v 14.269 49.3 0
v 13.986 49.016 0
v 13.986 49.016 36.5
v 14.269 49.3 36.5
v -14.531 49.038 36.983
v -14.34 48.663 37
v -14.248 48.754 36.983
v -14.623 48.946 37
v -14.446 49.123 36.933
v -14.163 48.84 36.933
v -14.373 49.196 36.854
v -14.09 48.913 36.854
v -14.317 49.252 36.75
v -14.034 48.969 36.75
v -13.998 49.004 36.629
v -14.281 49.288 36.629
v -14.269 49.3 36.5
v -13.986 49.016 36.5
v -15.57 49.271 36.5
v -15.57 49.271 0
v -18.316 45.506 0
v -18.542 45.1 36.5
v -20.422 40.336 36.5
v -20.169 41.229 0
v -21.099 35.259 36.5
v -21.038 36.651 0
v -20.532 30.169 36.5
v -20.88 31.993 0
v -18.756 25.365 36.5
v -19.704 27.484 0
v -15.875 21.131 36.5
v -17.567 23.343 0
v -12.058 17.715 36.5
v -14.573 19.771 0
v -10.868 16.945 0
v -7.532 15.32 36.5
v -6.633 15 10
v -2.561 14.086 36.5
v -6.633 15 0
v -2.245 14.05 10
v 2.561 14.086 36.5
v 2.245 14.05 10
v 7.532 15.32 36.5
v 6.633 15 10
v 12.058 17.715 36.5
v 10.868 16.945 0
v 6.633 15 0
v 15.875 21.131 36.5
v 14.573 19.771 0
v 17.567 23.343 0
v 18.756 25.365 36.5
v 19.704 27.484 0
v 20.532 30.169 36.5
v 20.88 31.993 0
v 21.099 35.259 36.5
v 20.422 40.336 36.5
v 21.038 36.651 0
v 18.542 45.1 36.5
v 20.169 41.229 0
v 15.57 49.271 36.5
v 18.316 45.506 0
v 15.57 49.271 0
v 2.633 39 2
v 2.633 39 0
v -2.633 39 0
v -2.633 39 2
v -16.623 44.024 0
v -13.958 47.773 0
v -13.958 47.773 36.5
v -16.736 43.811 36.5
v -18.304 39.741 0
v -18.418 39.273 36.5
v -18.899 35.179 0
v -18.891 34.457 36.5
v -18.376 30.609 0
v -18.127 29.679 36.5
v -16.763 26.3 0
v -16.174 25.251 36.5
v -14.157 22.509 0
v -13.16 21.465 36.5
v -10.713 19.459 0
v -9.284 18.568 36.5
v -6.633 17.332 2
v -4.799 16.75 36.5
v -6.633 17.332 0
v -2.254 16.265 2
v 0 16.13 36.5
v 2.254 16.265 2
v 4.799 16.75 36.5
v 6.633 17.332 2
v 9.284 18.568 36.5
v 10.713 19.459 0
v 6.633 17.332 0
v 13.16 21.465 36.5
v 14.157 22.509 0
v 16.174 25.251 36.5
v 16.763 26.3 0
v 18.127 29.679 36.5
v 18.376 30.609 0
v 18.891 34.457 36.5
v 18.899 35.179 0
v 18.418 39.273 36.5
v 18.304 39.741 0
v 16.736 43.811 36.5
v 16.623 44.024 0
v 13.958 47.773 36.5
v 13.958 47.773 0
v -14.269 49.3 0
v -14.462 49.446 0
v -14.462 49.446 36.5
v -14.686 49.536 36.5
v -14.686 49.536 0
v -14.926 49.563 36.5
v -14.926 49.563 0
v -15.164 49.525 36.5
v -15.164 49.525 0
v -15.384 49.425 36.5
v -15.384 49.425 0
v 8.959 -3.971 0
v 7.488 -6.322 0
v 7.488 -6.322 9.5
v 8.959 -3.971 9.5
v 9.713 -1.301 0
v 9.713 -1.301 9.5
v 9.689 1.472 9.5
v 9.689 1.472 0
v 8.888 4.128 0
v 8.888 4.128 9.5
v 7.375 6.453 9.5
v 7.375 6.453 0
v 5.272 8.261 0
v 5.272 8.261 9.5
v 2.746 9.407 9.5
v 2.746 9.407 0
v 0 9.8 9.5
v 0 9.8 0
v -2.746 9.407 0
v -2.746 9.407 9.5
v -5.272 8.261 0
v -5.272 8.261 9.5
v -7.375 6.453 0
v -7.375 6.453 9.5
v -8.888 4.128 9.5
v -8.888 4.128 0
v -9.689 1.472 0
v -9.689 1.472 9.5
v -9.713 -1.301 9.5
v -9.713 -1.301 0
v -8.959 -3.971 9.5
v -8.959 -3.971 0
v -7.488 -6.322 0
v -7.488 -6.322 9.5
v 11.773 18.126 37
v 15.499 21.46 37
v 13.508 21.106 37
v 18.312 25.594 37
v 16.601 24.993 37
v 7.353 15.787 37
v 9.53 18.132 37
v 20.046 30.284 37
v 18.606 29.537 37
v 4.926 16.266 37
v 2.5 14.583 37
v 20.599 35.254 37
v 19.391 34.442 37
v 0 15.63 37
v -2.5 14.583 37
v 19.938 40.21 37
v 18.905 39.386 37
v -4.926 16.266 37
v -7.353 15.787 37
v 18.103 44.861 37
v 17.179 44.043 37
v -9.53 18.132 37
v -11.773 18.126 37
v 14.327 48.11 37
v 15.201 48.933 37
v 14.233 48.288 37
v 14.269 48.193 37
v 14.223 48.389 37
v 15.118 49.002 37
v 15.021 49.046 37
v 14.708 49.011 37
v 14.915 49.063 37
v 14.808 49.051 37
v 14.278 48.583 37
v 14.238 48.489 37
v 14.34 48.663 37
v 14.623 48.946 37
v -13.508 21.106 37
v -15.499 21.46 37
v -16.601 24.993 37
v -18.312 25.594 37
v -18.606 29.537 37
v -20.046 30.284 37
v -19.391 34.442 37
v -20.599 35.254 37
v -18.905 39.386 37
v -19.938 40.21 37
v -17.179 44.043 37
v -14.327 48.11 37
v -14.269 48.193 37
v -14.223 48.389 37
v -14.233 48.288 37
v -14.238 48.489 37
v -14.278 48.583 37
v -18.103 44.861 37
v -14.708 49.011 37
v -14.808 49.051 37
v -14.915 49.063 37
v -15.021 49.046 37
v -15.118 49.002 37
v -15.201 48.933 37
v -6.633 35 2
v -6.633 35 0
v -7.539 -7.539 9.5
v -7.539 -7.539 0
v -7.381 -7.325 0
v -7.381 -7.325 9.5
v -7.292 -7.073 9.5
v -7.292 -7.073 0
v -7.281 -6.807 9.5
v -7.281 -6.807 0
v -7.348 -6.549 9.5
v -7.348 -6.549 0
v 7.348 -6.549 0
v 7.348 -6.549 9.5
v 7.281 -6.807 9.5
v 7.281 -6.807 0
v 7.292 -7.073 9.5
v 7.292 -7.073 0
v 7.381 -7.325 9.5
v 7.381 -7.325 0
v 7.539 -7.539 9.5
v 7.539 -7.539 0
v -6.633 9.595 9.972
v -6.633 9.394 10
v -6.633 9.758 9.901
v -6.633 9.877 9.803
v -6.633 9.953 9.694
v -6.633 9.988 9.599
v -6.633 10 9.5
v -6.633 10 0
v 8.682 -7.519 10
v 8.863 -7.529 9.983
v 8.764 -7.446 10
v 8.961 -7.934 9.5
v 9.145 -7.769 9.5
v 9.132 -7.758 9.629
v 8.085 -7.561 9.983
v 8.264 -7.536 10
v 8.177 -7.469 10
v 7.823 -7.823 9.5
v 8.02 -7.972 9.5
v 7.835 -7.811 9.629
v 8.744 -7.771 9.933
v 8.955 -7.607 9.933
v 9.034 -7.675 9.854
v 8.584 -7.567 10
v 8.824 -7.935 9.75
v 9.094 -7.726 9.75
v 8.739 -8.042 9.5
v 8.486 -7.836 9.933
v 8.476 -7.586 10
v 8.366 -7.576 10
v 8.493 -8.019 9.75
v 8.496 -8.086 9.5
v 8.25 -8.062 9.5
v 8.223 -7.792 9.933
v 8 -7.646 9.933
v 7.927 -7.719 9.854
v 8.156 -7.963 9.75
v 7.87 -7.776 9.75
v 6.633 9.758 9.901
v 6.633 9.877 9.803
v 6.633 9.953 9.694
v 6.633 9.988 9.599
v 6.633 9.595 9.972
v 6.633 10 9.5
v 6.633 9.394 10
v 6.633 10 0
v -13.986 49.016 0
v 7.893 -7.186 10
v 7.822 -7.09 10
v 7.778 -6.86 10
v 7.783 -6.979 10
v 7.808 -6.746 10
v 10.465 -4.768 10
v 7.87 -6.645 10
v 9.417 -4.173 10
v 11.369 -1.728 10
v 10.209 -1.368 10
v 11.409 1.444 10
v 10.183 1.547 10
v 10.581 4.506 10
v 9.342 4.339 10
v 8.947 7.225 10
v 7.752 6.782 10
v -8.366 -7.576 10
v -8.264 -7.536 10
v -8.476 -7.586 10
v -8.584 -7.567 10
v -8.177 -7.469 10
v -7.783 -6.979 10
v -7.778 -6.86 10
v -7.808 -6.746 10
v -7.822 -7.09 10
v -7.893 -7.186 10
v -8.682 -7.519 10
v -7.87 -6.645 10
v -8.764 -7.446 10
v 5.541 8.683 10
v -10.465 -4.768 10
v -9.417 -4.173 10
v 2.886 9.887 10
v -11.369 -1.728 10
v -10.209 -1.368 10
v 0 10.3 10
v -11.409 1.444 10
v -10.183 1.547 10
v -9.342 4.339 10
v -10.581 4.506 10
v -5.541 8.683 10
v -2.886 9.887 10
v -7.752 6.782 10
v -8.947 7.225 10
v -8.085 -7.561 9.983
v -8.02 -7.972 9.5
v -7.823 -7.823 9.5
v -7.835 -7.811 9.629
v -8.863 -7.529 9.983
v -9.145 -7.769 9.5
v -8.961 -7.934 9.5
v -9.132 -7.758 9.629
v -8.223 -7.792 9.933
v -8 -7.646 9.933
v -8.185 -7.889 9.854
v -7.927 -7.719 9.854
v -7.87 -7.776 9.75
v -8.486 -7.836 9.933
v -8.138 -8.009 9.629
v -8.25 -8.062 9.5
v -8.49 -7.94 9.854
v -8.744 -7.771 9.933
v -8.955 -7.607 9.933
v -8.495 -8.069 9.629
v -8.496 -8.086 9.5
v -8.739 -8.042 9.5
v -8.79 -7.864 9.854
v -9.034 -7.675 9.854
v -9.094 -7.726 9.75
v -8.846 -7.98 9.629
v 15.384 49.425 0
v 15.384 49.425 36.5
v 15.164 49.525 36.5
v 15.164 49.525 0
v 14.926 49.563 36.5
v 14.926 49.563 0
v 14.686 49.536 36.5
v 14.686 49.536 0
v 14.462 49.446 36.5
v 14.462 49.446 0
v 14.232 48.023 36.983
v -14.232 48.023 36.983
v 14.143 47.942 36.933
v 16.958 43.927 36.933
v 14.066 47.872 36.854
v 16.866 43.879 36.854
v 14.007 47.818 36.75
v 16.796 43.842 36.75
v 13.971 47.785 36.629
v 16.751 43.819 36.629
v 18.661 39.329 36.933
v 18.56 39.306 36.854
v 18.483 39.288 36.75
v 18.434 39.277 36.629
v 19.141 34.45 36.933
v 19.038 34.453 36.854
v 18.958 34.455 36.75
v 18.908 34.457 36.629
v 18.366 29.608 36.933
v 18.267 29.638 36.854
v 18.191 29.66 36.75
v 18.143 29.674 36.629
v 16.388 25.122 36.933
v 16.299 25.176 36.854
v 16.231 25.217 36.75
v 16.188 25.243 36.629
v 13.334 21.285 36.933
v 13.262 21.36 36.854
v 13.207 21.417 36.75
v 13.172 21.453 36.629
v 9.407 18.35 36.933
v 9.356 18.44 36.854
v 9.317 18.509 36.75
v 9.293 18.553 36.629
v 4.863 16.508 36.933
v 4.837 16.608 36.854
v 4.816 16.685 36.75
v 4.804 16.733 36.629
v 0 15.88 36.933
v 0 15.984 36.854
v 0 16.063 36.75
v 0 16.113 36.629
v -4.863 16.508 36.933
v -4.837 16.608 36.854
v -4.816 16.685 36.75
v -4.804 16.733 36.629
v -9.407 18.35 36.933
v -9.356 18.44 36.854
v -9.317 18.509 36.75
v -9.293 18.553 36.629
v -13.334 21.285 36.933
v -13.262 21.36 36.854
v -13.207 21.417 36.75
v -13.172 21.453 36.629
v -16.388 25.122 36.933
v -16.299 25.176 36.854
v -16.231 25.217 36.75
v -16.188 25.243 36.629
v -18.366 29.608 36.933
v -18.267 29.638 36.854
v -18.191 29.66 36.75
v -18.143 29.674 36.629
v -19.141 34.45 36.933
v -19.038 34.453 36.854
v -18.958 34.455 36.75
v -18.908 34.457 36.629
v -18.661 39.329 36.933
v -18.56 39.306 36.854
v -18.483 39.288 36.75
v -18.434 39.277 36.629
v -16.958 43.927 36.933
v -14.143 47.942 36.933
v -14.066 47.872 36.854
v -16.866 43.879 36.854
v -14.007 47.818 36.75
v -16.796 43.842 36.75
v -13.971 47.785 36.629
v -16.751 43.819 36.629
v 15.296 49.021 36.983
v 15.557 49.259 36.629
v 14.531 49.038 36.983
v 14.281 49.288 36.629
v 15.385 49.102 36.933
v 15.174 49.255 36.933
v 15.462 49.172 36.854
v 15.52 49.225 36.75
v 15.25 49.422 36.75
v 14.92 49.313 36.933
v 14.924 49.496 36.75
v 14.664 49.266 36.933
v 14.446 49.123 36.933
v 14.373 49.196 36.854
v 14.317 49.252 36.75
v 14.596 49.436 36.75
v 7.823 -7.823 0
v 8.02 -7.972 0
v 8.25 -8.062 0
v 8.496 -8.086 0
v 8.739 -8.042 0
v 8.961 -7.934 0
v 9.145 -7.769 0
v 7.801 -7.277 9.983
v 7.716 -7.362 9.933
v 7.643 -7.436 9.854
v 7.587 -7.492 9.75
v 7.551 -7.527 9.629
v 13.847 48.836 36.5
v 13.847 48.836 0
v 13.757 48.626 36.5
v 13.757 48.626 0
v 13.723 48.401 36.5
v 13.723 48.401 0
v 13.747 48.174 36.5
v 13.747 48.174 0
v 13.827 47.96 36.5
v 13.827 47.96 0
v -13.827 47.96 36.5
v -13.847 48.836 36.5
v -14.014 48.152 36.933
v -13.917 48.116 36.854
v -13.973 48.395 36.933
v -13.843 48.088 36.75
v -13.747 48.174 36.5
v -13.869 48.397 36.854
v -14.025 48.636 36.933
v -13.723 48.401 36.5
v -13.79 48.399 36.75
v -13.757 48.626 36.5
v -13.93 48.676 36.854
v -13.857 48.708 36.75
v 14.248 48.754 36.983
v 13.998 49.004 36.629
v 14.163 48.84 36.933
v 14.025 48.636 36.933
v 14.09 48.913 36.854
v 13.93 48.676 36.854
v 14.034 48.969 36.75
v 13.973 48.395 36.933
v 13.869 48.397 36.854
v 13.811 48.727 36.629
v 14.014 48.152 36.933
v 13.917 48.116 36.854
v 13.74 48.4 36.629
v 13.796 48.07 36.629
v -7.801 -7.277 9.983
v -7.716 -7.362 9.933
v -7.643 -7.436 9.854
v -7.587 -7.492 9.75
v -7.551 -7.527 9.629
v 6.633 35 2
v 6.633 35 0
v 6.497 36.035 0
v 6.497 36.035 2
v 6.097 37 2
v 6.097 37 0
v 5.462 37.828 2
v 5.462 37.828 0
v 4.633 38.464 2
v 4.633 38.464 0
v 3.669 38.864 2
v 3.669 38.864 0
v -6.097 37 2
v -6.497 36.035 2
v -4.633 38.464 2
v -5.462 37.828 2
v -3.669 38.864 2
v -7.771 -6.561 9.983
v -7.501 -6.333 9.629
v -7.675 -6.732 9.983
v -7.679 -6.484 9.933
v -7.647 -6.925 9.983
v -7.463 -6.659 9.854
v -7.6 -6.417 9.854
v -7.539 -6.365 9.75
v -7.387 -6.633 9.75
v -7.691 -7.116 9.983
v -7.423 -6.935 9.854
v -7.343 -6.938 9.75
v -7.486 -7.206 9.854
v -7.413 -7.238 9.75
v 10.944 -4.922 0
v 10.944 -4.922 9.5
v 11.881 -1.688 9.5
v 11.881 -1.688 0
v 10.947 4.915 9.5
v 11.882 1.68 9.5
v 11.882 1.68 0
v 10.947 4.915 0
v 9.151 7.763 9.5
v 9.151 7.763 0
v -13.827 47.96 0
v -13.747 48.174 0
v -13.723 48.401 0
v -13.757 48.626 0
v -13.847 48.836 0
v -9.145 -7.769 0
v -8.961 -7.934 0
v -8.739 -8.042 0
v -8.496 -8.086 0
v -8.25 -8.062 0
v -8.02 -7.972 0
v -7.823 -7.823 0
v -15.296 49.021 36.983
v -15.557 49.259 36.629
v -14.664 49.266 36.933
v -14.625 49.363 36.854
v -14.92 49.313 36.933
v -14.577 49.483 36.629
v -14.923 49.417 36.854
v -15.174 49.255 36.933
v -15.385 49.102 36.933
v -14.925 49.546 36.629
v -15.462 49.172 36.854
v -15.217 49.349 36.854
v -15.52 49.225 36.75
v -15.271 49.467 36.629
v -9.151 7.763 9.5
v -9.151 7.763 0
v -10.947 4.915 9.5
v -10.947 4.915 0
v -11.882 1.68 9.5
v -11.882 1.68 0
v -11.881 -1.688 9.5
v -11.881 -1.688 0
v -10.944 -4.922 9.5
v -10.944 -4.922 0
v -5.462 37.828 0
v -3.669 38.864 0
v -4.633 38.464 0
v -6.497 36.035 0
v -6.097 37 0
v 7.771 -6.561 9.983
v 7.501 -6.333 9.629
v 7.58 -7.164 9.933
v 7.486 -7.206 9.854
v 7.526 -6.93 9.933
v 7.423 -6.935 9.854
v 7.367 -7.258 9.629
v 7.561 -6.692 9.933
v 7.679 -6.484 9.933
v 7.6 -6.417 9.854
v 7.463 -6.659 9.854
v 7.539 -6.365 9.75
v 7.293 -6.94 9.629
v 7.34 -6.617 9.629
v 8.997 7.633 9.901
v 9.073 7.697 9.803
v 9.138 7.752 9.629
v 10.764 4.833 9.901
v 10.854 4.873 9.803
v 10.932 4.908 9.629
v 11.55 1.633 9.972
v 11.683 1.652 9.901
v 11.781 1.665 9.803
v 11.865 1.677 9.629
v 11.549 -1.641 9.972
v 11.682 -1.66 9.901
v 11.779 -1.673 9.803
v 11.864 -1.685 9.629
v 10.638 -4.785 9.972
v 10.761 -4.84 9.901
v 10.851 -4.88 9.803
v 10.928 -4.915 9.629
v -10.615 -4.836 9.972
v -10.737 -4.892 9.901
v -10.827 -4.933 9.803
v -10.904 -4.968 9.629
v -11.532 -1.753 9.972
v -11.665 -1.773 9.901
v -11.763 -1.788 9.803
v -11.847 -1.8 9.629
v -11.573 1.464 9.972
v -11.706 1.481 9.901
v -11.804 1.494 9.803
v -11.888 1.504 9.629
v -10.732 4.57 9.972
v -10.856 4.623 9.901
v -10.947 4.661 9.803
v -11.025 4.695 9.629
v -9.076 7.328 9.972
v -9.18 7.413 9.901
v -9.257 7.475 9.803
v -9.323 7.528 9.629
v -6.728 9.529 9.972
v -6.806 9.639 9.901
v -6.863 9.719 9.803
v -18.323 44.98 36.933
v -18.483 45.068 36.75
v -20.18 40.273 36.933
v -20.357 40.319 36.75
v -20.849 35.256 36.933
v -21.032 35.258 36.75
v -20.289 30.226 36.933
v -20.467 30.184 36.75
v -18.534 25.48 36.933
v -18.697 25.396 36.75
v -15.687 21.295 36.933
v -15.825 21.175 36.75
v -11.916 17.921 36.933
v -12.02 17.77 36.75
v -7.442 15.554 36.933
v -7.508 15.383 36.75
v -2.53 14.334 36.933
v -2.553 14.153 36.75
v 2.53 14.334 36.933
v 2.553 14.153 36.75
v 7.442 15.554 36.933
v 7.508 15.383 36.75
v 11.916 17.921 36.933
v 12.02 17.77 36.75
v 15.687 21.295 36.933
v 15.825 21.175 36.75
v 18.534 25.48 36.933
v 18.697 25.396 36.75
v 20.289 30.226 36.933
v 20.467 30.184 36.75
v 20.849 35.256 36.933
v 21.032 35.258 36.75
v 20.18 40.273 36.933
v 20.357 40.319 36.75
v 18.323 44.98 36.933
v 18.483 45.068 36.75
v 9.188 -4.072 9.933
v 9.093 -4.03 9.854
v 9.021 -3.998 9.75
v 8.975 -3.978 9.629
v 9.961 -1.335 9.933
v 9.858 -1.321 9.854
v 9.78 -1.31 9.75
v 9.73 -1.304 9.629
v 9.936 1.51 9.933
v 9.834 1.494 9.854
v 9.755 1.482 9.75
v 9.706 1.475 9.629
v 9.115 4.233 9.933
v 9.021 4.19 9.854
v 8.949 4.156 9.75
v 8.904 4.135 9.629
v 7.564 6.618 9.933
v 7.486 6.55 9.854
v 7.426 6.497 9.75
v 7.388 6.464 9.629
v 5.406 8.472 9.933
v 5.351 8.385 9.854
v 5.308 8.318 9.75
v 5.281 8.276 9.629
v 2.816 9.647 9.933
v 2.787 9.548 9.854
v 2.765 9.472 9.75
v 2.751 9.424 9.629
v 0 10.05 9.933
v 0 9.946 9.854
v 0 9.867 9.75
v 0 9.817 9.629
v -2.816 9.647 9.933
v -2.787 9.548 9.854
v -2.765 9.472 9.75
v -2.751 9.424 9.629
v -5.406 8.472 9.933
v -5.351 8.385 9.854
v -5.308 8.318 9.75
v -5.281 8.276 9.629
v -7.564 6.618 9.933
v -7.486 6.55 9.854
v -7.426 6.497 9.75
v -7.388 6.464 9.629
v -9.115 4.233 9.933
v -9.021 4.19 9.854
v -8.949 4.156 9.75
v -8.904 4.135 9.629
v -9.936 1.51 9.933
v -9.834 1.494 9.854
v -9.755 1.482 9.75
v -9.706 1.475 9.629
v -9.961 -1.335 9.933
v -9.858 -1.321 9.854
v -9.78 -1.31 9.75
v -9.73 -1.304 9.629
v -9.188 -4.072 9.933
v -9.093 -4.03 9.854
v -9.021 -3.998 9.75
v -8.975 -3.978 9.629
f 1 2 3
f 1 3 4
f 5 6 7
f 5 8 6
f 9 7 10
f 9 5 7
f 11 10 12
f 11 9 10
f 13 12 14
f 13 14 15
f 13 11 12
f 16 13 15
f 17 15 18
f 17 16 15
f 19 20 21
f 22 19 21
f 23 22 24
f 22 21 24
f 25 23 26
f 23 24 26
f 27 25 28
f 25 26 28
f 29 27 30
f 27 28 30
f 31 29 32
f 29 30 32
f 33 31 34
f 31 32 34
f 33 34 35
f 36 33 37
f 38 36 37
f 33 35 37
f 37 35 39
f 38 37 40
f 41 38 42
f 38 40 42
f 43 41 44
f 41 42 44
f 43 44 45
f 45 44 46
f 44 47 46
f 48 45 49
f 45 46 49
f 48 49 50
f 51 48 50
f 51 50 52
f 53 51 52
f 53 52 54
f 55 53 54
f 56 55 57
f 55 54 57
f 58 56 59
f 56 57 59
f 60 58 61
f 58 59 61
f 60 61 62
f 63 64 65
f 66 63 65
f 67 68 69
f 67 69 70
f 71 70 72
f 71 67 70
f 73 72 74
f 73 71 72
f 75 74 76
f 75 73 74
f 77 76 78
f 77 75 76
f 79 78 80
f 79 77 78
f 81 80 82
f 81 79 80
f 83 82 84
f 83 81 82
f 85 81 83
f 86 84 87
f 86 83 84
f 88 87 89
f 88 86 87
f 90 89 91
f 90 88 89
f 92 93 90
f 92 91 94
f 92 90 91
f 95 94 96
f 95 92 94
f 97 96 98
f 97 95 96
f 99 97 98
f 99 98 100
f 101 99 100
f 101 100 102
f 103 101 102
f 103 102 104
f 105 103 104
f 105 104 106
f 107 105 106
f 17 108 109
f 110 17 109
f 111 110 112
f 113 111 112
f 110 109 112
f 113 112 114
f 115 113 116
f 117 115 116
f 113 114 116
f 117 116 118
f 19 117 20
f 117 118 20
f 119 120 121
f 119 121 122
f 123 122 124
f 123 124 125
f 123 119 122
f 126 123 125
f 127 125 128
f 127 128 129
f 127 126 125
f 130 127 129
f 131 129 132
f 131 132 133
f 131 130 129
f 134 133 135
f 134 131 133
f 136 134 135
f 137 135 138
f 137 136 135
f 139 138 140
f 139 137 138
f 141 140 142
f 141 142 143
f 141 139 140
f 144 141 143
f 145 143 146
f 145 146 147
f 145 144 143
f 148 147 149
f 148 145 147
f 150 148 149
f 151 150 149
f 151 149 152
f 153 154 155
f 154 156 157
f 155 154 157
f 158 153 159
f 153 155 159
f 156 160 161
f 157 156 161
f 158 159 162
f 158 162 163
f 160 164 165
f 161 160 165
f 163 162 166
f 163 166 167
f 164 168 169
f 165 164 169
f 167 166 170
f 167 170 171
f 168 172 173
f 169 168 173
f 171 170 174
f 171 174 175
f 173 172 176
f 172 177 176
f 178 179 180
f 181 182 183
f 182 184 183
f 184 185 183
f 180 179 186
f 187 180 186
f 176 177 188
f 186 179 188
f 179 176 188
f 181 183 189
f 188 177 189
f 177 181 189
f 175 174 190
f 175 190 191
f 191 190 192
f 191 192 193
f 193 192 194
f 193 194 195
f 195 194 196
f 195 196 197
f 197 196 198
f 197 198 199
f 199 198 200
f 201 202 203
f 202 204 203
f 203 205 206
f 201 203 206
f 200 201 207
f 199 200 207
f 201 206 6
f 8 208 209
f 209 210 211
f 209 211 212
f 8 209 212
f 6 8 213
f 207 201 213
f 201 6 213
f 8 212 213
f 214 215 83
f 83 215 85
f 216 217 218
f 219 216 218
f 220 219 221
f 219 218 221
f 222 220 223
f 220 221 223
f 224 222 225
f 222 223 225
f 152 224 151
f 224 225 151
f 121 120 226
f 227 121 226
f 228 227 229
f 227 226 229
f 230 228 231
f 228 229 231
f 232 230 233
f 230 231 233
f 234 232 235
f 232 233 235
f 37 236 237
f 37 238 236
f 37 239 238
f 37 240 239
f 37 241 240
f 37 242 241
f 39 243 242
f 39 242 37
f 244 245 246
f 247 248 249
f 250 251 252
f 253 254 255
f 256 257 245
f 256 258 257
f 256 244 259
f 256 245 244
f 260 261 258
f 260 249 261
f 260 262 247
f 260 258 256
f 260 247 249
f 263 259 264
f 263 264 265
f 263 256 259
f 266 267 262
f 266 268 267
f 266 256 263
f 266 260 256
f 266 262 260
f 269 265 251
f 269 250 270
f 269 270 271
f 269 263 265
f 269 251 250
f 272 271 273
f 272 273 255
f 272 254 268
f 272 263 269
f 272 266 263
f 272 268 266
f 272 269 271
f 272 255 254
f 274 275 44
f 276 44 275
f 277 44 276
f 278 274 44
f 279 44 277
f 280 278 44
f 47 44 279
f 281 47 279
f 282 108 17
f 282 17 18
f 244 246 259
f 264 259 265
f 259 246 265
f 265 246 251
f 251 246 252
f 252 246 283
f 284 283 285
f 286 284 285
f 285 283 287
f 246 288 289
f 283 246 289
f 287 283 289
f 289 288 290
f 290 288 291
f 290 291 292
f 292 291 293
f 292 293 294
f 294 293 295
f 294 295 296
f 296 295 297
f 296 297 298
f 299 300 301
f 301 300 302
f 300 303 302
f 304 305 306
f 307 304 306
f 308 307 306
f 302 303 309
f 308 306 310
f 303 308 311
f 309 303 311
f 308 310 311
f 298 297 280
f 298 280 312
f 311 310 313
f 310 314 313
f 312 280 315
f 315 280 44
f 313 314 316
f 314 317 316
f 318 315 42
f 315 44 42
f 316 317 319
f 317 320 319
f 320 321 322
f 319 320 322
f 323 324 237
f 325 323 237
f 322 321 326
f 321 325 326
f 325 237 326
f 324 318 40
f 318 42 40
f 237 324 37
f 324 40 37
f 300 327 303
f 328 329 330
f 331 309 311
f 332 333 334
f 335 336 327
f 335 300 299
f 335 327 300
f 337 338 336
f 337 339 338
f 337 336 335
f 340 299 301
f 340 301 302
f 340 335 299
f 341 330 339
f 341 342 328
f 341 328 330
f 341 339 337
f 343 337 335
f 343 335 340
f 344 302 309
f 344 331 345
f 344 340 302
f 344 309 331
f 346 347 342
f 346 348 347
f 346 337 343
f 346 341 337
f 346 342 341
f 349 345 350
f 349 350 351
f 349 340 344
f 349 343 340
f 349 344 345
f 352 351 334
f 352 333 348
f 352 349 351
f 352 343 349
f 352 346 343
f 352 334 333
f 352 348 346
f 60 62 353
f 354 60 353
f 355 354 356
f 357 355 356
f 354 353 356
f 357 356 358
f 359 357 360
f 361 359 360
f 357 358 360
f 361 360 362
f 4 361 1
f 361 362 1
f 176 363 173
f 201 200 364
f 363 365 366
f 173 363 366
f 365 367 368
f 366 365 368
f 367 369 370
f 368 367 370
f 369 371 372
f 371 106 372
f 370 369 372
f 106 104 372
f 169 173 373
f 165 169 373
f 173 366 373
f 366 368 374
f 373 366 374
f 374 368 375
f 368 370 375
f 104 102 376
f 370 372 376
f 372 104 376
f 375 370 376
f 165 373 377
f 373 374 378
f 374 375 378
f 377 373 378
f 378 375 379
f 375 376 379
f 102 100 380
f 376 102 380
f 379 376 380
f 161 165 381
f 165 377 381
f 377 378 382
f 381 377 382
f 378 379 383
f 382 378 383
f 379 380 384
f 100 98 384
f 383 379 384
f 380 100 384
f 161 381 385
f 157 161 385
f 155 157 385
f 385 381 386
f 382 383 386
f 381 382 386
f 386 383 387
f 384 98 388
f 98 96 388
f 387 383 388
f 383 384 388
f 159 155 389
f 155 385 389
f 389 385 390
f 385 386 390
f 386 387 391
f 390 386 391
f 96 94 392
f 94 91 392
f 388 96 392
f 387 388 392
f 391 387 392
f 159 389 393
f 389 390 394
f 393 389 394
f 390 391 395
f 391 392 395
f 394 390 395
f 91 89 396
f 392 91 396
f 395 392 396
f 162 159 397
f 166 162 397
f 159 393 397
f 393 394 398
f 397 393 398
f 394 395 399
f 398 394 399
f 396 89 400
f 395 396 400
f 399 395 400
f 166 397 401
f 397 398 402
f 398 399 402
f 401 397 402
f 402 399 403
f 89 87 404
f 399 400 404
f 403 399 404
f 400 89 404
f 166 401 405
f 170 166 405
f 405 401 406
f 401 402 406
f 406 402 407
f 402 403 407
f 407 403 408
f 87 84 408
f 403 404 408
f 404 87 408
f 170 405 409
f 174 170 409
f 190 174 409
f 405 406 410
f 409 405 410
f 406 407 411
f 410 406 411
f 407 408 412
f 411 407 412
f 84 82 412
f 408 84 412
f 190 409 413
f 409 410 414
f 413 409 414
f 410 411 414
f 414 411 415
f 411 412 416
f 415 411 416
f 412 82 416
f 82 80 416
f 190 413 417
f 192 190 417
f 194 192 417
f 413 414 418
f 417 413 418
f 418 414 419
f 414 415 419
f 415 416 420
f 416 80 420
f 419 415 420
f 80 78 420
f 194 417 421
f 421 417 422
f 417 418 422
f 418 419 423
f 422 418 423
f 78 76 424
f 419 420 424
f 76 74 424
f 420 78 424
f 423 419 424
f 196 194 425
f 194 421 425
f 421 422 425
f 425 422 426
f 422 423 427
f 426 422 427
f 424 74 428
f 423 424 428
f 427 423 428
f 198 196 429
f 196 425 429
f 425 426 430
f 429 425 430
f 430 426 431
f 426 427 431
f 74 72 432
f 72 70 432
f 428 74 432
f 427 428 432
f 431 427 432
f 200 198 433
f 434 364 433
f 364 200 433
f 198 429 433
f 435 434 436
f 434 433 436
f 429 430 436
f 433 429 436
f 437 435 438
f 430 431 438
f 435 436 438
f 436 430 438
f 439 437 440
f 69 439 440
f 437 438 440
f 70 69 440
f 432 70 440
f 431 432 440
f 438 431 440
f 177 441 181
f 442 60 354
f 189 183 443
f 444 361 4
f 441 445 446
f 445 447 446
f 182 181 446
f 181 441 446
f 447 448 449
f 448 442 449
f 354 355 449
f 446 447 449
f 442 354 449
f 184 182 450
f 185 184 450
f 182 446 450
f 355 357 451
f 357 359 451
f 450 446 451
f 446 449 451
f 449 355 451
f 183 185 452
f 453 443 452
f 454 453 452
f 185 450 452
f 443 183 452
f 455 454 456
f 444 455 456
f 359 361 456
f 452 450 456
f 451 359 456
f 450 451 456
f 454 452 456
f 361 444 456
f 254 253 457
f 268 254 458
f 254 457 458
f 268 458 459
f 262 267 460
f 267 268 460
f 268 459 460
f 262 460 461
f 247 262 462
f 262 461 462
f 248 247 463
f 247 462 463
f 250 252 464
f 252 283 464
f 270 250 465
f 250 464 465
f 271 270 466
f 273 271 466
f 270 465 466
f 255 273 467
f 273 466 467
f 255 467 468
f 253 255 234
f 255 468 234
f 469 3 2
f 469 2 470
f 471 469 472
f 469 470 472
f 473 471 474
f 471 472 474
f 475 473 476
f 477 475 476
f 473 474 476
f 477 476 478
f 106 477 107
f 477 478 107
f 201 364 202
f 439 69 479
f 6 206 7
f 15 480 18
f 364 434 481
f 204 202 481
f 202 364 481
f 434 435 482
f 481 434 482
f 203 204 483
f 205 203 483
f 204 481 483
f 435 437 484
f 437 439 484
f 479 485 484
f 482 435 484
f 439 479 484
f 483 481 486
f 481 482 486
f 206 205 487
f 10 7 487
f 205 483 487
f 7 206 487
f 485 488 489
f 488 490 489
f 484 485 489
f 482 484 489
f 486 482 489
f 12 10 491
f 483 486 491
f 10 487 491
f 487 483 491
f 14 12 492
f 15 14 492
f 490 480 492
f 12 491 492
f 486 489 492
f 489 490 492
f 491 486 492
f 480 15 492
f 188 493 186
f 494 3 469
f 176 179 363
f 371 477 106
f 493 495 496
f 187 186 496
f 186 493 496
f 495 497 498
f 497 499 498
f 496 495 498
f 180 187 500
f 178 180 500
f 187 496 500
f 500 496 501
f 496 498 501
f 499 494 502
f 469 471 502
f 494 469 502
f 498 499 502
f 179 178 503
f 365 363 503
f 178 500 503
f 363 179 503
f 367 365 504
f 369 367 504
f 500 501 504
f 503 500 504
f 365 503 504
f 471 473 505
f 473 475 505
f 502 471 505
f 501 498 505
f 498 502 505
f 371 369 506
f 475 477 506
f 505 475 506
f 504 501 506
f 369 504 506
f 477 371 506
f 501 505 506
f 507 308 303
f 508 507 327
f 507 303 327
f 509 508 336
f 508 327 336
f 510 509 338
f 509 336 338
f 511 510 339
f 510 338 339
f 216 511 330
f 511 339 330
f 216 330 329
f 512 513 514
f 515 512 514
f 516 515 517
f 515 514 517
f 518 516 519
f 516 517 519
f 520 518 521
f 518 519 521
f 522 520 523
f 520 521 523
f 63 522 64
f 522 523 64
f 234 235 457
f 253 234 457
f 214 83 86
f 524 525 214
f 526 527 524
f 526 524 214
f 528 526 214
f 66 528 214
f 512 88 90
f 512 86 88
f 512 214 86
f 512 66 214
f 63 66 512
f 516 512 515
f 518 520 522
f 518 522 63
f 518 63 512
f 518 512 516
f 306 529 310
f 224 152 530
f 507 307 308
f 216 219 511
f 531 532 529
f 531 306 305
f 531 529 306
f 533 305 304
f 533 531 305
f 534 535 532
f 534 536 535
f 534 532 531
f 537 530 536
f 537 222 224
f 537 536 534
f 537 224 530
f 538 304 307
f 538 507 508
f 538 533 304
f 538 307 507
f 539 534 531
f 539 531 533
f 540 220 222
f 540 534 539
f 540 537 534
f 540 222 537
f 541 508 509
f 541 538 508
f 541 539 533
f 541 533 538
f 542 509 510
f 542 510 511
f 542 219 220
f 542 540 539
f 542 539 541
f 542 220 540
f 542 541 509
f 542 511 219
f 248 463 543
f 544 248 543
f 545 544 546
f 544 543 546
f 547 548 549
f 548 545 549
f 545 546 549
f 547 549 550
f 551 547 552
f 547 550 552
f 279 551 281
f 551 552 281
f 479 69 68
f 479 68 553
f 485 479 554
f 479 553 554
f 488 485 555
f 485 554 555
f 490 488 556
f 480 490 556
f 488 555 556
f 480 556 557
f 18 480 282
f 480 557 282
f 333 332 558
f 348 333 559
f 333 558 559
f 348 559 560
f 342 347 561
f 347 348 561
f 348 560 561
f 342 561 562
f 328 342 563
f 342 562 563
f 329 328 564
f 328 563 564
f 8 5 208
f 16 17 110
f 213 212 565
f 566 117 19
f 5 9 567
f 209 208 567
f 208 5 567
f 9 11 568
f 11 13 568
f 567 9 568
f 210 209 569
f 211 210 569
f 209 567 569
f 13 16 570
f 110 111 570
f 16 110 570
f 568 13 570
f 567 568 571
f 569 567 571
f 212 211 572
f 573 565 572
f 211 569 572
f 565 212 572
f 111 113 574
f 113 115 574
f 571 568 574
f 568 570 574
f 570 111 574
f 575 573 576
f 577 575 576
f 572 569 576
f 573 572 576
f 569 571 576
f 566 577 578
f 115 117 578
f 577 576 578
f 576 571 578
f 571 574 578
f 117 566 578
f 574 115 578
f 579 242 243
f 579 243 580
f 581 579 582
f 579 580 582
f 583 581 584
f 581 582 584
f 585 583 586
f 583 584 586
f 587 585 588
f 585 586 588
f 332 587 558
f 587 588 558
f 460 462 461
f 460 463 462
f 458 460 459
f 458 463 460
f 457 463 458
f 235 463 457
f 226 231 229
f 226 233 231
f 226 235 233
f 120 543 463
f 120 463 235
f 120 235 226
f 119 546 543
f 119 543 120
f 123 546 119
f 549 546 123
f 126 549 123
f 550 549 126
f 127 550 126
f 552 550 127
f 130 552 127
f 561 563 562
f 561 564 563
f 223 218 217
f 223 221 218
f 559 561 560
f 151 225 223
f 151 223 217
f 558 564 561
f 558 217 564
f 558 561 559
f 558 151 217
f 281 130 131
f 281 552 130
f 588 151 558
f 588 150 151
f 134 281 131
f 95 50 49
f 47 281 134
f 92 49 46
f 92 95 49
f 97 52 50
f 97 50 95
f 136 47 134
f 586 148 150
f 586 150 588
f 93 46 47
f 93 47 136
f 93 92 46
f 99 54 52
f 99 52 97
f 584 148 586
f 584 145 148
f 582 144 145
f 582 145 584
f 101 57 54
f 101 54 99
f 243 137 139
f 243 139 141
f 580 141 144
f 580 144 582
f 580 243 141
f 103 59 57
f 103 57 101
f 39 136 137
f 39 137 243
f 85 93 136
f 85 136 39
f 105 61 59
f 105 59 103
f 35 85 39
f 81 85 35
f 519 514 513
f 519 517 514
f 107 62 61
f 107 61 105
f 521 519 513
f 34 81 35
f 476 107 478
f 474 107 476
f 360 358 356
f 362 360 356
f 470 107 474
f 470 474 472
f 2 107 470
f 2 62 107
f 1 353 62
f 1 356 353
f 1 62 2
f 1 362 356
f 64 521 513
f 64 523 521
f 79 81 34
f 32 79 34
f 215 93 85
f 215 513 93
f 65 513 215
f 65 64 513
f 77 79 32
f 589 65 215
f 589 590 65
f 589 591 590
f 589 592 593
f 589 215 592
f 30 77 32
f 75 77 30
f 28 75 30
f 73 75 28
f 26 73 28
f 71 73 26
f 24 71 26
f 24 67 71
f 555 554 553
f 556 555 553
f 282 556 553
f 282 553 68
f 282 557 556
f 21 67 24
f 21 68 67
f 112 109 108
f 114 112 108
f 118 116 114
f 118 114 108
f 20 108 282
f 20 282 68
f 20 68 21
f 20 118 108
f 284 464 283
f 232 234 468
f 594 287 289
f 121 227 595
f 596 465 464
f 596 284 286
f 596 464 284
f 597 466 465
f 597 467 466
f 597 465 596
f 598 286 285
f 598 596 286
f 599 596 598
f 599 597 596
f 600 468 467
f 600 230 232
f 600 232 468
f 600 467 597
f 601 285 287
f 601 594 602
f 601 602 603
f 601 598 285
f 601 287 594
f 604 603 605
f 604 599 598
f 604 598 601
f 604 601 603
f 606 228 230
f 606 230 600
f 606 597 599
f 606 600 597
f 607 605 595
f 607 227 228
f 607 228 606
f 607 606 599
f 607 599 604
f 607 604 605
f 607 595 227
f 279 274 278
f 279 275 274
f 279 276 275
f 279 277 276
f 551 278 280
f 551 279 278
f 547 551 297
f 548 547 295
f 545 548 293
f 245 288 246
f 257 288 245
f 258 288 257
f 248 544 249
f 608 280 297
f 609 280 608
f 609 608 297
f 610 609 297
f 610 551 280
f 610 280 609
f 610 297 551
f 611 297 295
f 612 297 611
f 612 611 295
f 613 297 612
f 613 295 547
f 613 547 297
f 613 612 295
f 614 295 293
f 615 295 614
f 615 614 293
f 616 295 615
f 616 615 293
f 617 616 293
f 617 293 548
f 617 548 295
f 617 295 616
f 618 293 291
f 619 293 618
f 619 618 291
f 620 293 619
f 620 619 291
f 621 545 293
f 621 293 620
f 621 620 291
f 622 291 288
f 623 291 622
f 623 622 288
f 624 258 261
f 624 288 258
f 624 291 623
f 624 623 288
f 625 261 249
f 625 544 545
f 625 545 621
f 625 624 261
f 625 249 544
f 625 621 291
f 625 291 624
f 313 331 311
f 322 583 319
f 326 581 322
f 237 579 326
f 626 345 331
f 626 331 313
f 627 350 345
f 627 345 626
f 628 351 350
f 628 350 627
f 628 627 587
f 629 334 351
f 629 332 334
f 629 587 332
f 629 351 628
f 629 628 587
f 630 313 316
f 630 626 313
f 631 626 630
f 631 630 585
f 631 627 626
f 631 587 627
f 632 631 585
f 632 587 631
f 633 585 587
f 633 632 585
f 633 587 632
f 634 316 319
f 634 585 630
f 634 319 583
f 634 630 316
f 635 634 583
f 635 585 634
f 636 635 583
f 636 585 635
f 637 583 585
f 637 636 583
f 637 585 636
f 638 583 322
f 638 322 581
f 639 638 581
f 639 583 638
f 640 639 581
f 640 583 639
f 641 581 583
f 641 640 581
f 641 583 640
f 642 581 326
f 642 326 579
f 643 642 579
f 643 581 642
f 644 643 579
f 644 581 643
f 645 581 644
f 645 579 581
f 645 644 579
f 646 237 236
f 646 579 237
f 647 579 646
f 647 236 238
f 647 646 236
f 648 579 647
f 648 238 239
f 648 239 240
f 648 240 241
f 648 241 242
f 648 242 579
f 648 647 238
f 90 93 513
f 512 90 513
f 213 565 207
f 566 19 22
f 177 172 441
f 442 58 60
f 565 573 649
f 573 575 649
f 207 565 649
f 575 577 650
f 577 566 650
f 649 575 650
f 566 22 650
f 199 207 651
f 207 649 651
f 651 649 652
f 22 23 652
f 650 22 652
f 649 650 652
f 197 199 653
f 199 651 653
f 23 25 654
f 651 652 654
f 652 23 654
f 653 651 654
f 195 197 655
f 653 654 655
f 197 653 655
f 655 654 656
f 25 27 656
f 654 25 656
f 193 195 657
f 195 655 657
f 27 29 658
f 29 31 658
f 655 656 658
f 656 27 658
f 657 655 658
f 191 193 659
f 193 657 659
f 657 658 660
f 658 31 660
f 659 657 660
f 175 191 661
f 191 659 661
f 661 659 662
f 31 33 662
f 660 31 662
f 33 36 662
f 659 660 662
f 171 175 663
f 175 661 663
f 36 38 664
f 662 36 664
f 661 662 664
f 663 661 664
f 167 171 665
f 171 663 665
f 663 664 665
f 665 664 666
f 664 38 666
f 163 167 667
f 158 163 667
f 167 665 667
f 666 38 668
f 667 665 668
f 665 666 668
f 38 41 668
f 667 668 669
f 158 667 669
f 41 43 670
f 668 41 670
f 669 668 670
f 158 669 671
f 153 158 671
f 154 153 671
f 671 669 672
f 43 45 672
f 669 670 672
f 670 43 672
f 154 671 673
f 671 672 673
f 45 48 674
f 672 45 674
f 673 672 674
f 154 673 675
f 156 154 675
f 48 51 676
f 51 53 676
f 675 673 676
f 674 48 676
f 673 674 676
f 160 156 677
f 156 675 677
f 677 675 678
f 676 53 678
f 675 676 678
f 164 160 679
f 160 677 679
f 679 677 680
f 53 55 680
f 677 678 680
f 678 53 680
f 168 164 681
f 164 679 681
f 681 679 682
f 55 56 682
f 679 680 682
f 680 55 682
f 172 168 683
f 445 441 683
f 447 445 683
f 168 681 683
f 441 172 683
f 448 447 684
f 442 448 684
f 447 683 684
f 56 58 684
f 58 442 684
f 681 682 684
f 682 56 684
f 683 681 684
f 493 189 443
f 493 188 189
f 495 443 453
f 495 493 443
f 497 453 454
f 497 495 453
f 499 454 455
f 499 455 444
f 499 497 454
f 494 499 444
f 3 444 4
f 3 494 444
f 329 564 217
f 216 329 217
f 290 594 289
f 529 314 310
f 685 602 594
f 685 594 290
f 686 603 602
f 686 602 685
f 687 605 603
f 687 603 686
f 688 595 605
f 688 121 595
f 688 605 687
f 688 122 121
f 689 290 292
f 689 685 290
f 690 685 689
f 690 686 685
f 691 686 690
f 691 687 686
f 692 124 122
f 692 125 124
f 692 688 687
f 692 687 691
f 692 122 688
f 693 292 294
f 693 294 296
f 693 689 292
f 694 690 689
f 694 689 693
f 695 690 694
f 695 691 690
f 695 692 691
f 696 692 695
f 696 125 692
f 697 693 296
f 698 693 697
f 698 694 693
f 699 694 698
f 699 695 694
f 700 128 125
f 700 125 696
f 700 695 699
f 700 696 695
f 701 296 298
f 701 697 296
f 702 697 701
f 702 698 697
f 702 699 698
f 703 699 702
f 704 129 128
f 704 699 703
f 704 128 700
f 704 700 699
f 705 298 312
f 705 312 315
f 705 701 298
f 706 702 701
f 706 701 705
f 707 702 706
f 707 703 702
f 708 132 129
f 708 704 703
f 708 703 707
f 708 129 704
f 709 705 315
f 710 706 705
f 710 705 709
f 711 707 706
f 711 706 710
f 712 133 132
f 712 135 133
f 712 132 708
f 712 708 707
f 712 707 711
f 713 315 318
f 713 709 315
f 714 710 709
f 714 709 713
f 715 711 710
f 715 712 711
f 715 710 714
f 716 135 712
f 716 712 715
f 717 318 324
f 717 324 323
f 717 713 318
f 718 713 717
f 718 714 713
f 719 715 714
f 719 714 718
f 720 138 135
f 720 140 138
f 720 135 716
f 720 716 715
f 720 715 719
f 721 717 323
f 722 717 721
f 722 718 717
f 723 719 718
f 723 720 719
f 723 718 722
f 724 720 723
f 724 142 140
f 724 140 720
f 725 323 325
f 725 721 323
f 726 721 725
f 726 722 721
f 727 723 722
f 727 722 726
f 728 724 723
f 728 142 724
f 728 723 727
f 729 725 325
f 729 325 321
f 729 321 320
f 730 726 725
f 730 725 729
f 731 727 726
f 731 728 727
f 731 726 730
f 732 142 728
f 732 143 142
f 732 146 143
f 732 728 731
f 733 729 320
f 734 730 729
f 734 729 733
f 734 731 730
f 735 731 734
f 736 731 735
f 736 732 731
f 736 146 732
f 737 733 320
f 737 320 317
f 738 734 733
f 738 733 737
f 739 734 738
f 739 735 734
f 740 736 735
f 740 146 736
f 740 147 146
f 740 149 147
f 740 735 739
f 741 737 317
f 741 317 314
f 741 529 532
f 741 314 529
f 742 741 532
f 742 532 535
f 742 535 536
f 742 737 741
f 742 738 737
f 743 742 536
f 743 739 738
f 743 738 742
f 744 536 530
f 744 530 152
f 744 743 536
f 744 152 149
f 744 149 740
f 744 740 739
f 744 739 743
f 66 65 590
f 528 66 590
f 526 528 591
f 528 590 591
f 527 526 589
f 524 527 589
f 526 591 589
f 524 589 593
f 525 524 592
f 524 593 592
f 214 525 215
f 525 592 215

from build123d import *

# Parameters (mm, degrees)
PAD_DEPTH    = 10
PAD001_DEPTH = 10
PAD002_DEPTH = 37
PAD003_DEPTH = 2
FILLET_R     = 0.5


with BuildPart() as part:
    # Sketch → Pad (new body)
    with BuildSketch(Plane.XY):
        with BuildLine():
            ThreePointArc((7.487957, -6.322222), (0, 9.8), (-7.487957, -6.322222))
            ThreePointArc((-7.539231, -7.539231), (-7.276425, -6.940719), (-7.487957, -6.322222))
            Line((-7.823043, -7.823043), (-7.539231, -7.539231))
            ThreePointArc((-9.145339, -7.769348), (-8.495956, -8.085906), (-7.823043, -7.823043))
            ThreePointArc((9.145339, -7.769348), (0, 12), (-9.145339, -7.769348))
            ThreePointArc((7.823043, -7.823043), (8.495956, -8.085906), (9.145339, -7.769348))
            Line((7.539231, -7.539231), (7.823043, -7.823043))
            ThreePointArc((7.487957, -6.322222), (7.276425, -6.940719), (7.539231, -7.539231))
        make_face()
    extrude(amount=PAD_DEPTH)

    # Sketch001 → Pad001 (join)
    with BuildSketch(Plane.XY):
        with BuildLine():
            Line((-6.63325, 15), (6.63325, 15))
            Line((6.63325, 15), (6.63325, 10))
            ThreePointArc((6.63325, 10), (0, 12), (-6.63325, 10))
            Line((-6.63325, 10), (-6.63325, 15))
        make_face()
    extrude(amount=PAD001_DEPTH)

    # Sketch002 → Pad002 (join)
    with BuildSketch(Plane.XY):
        with BuildLine():
            ThreePointArc((-13.957974, 47.773263), (0, 16.130227), (13.957974, 47.773263))
            ThreePointArc((13.986243, 49.01647), (13.722872, 48.400534), (13.957974, 47.773263))
            Line((13.986243, 49.01647), (14.269373, 49.2996))
            ThreePointArc((15.569887, 49.270614), (14.925823, 49.56298), (14.269373, 49.2996))
            ThreePointArc((-15.569887, 49.270614), (0, 13.930227), (15.569887, 49.270614))
            ThreePointArc((-14.269373, 49.2996), (-14.925823, 49.56298), (-15.569887, 49.270614))
            Line((-14.269373, 49.2996), (-13.986243, 49.01647))
            ThreePointArc((-13.957974, 47.773263), (-13.722872, 48.400534), (-13.986243, 49.01647))
        make_face()
    extrude(amount=PAD002_DEPTH)

    # Sketch003 → Pad003 (join)
    with BuildSketch(Plane.XY):
        with BuildLine():
            Line((6.63325, 15), (6.63325, 35))
            ThreePointArc((6.63325, 35), (5.461677, 37.828427), (2.63325, 39))
            Line((2.63325, 39), (-2.63325, 39))
            ThreePointArc((-2.63325, 39), (-5.461677, 37.828427), (-6.63325, 35))
            Line((-6.63325, 35), (-6.63325, 15))
            Line((-6.63325, 15), (6.63325, 15))
        make_face()
    extrude(amount=PAD003_DEPTH)

    # Fillet
    fillet_edges = [part.edges().sort_by_distance(p)[0] for p in [
        (0, 9.8, 10),
        (11.881852, 1.679762, 10),
        (-11.881852, 1.679762, 10),
        (0, 13.930227, 37),
        (0, 16.130227, 37),
    ]]
    fillet(fillet_edges, radius=FILLET_R)


solid = part.part
